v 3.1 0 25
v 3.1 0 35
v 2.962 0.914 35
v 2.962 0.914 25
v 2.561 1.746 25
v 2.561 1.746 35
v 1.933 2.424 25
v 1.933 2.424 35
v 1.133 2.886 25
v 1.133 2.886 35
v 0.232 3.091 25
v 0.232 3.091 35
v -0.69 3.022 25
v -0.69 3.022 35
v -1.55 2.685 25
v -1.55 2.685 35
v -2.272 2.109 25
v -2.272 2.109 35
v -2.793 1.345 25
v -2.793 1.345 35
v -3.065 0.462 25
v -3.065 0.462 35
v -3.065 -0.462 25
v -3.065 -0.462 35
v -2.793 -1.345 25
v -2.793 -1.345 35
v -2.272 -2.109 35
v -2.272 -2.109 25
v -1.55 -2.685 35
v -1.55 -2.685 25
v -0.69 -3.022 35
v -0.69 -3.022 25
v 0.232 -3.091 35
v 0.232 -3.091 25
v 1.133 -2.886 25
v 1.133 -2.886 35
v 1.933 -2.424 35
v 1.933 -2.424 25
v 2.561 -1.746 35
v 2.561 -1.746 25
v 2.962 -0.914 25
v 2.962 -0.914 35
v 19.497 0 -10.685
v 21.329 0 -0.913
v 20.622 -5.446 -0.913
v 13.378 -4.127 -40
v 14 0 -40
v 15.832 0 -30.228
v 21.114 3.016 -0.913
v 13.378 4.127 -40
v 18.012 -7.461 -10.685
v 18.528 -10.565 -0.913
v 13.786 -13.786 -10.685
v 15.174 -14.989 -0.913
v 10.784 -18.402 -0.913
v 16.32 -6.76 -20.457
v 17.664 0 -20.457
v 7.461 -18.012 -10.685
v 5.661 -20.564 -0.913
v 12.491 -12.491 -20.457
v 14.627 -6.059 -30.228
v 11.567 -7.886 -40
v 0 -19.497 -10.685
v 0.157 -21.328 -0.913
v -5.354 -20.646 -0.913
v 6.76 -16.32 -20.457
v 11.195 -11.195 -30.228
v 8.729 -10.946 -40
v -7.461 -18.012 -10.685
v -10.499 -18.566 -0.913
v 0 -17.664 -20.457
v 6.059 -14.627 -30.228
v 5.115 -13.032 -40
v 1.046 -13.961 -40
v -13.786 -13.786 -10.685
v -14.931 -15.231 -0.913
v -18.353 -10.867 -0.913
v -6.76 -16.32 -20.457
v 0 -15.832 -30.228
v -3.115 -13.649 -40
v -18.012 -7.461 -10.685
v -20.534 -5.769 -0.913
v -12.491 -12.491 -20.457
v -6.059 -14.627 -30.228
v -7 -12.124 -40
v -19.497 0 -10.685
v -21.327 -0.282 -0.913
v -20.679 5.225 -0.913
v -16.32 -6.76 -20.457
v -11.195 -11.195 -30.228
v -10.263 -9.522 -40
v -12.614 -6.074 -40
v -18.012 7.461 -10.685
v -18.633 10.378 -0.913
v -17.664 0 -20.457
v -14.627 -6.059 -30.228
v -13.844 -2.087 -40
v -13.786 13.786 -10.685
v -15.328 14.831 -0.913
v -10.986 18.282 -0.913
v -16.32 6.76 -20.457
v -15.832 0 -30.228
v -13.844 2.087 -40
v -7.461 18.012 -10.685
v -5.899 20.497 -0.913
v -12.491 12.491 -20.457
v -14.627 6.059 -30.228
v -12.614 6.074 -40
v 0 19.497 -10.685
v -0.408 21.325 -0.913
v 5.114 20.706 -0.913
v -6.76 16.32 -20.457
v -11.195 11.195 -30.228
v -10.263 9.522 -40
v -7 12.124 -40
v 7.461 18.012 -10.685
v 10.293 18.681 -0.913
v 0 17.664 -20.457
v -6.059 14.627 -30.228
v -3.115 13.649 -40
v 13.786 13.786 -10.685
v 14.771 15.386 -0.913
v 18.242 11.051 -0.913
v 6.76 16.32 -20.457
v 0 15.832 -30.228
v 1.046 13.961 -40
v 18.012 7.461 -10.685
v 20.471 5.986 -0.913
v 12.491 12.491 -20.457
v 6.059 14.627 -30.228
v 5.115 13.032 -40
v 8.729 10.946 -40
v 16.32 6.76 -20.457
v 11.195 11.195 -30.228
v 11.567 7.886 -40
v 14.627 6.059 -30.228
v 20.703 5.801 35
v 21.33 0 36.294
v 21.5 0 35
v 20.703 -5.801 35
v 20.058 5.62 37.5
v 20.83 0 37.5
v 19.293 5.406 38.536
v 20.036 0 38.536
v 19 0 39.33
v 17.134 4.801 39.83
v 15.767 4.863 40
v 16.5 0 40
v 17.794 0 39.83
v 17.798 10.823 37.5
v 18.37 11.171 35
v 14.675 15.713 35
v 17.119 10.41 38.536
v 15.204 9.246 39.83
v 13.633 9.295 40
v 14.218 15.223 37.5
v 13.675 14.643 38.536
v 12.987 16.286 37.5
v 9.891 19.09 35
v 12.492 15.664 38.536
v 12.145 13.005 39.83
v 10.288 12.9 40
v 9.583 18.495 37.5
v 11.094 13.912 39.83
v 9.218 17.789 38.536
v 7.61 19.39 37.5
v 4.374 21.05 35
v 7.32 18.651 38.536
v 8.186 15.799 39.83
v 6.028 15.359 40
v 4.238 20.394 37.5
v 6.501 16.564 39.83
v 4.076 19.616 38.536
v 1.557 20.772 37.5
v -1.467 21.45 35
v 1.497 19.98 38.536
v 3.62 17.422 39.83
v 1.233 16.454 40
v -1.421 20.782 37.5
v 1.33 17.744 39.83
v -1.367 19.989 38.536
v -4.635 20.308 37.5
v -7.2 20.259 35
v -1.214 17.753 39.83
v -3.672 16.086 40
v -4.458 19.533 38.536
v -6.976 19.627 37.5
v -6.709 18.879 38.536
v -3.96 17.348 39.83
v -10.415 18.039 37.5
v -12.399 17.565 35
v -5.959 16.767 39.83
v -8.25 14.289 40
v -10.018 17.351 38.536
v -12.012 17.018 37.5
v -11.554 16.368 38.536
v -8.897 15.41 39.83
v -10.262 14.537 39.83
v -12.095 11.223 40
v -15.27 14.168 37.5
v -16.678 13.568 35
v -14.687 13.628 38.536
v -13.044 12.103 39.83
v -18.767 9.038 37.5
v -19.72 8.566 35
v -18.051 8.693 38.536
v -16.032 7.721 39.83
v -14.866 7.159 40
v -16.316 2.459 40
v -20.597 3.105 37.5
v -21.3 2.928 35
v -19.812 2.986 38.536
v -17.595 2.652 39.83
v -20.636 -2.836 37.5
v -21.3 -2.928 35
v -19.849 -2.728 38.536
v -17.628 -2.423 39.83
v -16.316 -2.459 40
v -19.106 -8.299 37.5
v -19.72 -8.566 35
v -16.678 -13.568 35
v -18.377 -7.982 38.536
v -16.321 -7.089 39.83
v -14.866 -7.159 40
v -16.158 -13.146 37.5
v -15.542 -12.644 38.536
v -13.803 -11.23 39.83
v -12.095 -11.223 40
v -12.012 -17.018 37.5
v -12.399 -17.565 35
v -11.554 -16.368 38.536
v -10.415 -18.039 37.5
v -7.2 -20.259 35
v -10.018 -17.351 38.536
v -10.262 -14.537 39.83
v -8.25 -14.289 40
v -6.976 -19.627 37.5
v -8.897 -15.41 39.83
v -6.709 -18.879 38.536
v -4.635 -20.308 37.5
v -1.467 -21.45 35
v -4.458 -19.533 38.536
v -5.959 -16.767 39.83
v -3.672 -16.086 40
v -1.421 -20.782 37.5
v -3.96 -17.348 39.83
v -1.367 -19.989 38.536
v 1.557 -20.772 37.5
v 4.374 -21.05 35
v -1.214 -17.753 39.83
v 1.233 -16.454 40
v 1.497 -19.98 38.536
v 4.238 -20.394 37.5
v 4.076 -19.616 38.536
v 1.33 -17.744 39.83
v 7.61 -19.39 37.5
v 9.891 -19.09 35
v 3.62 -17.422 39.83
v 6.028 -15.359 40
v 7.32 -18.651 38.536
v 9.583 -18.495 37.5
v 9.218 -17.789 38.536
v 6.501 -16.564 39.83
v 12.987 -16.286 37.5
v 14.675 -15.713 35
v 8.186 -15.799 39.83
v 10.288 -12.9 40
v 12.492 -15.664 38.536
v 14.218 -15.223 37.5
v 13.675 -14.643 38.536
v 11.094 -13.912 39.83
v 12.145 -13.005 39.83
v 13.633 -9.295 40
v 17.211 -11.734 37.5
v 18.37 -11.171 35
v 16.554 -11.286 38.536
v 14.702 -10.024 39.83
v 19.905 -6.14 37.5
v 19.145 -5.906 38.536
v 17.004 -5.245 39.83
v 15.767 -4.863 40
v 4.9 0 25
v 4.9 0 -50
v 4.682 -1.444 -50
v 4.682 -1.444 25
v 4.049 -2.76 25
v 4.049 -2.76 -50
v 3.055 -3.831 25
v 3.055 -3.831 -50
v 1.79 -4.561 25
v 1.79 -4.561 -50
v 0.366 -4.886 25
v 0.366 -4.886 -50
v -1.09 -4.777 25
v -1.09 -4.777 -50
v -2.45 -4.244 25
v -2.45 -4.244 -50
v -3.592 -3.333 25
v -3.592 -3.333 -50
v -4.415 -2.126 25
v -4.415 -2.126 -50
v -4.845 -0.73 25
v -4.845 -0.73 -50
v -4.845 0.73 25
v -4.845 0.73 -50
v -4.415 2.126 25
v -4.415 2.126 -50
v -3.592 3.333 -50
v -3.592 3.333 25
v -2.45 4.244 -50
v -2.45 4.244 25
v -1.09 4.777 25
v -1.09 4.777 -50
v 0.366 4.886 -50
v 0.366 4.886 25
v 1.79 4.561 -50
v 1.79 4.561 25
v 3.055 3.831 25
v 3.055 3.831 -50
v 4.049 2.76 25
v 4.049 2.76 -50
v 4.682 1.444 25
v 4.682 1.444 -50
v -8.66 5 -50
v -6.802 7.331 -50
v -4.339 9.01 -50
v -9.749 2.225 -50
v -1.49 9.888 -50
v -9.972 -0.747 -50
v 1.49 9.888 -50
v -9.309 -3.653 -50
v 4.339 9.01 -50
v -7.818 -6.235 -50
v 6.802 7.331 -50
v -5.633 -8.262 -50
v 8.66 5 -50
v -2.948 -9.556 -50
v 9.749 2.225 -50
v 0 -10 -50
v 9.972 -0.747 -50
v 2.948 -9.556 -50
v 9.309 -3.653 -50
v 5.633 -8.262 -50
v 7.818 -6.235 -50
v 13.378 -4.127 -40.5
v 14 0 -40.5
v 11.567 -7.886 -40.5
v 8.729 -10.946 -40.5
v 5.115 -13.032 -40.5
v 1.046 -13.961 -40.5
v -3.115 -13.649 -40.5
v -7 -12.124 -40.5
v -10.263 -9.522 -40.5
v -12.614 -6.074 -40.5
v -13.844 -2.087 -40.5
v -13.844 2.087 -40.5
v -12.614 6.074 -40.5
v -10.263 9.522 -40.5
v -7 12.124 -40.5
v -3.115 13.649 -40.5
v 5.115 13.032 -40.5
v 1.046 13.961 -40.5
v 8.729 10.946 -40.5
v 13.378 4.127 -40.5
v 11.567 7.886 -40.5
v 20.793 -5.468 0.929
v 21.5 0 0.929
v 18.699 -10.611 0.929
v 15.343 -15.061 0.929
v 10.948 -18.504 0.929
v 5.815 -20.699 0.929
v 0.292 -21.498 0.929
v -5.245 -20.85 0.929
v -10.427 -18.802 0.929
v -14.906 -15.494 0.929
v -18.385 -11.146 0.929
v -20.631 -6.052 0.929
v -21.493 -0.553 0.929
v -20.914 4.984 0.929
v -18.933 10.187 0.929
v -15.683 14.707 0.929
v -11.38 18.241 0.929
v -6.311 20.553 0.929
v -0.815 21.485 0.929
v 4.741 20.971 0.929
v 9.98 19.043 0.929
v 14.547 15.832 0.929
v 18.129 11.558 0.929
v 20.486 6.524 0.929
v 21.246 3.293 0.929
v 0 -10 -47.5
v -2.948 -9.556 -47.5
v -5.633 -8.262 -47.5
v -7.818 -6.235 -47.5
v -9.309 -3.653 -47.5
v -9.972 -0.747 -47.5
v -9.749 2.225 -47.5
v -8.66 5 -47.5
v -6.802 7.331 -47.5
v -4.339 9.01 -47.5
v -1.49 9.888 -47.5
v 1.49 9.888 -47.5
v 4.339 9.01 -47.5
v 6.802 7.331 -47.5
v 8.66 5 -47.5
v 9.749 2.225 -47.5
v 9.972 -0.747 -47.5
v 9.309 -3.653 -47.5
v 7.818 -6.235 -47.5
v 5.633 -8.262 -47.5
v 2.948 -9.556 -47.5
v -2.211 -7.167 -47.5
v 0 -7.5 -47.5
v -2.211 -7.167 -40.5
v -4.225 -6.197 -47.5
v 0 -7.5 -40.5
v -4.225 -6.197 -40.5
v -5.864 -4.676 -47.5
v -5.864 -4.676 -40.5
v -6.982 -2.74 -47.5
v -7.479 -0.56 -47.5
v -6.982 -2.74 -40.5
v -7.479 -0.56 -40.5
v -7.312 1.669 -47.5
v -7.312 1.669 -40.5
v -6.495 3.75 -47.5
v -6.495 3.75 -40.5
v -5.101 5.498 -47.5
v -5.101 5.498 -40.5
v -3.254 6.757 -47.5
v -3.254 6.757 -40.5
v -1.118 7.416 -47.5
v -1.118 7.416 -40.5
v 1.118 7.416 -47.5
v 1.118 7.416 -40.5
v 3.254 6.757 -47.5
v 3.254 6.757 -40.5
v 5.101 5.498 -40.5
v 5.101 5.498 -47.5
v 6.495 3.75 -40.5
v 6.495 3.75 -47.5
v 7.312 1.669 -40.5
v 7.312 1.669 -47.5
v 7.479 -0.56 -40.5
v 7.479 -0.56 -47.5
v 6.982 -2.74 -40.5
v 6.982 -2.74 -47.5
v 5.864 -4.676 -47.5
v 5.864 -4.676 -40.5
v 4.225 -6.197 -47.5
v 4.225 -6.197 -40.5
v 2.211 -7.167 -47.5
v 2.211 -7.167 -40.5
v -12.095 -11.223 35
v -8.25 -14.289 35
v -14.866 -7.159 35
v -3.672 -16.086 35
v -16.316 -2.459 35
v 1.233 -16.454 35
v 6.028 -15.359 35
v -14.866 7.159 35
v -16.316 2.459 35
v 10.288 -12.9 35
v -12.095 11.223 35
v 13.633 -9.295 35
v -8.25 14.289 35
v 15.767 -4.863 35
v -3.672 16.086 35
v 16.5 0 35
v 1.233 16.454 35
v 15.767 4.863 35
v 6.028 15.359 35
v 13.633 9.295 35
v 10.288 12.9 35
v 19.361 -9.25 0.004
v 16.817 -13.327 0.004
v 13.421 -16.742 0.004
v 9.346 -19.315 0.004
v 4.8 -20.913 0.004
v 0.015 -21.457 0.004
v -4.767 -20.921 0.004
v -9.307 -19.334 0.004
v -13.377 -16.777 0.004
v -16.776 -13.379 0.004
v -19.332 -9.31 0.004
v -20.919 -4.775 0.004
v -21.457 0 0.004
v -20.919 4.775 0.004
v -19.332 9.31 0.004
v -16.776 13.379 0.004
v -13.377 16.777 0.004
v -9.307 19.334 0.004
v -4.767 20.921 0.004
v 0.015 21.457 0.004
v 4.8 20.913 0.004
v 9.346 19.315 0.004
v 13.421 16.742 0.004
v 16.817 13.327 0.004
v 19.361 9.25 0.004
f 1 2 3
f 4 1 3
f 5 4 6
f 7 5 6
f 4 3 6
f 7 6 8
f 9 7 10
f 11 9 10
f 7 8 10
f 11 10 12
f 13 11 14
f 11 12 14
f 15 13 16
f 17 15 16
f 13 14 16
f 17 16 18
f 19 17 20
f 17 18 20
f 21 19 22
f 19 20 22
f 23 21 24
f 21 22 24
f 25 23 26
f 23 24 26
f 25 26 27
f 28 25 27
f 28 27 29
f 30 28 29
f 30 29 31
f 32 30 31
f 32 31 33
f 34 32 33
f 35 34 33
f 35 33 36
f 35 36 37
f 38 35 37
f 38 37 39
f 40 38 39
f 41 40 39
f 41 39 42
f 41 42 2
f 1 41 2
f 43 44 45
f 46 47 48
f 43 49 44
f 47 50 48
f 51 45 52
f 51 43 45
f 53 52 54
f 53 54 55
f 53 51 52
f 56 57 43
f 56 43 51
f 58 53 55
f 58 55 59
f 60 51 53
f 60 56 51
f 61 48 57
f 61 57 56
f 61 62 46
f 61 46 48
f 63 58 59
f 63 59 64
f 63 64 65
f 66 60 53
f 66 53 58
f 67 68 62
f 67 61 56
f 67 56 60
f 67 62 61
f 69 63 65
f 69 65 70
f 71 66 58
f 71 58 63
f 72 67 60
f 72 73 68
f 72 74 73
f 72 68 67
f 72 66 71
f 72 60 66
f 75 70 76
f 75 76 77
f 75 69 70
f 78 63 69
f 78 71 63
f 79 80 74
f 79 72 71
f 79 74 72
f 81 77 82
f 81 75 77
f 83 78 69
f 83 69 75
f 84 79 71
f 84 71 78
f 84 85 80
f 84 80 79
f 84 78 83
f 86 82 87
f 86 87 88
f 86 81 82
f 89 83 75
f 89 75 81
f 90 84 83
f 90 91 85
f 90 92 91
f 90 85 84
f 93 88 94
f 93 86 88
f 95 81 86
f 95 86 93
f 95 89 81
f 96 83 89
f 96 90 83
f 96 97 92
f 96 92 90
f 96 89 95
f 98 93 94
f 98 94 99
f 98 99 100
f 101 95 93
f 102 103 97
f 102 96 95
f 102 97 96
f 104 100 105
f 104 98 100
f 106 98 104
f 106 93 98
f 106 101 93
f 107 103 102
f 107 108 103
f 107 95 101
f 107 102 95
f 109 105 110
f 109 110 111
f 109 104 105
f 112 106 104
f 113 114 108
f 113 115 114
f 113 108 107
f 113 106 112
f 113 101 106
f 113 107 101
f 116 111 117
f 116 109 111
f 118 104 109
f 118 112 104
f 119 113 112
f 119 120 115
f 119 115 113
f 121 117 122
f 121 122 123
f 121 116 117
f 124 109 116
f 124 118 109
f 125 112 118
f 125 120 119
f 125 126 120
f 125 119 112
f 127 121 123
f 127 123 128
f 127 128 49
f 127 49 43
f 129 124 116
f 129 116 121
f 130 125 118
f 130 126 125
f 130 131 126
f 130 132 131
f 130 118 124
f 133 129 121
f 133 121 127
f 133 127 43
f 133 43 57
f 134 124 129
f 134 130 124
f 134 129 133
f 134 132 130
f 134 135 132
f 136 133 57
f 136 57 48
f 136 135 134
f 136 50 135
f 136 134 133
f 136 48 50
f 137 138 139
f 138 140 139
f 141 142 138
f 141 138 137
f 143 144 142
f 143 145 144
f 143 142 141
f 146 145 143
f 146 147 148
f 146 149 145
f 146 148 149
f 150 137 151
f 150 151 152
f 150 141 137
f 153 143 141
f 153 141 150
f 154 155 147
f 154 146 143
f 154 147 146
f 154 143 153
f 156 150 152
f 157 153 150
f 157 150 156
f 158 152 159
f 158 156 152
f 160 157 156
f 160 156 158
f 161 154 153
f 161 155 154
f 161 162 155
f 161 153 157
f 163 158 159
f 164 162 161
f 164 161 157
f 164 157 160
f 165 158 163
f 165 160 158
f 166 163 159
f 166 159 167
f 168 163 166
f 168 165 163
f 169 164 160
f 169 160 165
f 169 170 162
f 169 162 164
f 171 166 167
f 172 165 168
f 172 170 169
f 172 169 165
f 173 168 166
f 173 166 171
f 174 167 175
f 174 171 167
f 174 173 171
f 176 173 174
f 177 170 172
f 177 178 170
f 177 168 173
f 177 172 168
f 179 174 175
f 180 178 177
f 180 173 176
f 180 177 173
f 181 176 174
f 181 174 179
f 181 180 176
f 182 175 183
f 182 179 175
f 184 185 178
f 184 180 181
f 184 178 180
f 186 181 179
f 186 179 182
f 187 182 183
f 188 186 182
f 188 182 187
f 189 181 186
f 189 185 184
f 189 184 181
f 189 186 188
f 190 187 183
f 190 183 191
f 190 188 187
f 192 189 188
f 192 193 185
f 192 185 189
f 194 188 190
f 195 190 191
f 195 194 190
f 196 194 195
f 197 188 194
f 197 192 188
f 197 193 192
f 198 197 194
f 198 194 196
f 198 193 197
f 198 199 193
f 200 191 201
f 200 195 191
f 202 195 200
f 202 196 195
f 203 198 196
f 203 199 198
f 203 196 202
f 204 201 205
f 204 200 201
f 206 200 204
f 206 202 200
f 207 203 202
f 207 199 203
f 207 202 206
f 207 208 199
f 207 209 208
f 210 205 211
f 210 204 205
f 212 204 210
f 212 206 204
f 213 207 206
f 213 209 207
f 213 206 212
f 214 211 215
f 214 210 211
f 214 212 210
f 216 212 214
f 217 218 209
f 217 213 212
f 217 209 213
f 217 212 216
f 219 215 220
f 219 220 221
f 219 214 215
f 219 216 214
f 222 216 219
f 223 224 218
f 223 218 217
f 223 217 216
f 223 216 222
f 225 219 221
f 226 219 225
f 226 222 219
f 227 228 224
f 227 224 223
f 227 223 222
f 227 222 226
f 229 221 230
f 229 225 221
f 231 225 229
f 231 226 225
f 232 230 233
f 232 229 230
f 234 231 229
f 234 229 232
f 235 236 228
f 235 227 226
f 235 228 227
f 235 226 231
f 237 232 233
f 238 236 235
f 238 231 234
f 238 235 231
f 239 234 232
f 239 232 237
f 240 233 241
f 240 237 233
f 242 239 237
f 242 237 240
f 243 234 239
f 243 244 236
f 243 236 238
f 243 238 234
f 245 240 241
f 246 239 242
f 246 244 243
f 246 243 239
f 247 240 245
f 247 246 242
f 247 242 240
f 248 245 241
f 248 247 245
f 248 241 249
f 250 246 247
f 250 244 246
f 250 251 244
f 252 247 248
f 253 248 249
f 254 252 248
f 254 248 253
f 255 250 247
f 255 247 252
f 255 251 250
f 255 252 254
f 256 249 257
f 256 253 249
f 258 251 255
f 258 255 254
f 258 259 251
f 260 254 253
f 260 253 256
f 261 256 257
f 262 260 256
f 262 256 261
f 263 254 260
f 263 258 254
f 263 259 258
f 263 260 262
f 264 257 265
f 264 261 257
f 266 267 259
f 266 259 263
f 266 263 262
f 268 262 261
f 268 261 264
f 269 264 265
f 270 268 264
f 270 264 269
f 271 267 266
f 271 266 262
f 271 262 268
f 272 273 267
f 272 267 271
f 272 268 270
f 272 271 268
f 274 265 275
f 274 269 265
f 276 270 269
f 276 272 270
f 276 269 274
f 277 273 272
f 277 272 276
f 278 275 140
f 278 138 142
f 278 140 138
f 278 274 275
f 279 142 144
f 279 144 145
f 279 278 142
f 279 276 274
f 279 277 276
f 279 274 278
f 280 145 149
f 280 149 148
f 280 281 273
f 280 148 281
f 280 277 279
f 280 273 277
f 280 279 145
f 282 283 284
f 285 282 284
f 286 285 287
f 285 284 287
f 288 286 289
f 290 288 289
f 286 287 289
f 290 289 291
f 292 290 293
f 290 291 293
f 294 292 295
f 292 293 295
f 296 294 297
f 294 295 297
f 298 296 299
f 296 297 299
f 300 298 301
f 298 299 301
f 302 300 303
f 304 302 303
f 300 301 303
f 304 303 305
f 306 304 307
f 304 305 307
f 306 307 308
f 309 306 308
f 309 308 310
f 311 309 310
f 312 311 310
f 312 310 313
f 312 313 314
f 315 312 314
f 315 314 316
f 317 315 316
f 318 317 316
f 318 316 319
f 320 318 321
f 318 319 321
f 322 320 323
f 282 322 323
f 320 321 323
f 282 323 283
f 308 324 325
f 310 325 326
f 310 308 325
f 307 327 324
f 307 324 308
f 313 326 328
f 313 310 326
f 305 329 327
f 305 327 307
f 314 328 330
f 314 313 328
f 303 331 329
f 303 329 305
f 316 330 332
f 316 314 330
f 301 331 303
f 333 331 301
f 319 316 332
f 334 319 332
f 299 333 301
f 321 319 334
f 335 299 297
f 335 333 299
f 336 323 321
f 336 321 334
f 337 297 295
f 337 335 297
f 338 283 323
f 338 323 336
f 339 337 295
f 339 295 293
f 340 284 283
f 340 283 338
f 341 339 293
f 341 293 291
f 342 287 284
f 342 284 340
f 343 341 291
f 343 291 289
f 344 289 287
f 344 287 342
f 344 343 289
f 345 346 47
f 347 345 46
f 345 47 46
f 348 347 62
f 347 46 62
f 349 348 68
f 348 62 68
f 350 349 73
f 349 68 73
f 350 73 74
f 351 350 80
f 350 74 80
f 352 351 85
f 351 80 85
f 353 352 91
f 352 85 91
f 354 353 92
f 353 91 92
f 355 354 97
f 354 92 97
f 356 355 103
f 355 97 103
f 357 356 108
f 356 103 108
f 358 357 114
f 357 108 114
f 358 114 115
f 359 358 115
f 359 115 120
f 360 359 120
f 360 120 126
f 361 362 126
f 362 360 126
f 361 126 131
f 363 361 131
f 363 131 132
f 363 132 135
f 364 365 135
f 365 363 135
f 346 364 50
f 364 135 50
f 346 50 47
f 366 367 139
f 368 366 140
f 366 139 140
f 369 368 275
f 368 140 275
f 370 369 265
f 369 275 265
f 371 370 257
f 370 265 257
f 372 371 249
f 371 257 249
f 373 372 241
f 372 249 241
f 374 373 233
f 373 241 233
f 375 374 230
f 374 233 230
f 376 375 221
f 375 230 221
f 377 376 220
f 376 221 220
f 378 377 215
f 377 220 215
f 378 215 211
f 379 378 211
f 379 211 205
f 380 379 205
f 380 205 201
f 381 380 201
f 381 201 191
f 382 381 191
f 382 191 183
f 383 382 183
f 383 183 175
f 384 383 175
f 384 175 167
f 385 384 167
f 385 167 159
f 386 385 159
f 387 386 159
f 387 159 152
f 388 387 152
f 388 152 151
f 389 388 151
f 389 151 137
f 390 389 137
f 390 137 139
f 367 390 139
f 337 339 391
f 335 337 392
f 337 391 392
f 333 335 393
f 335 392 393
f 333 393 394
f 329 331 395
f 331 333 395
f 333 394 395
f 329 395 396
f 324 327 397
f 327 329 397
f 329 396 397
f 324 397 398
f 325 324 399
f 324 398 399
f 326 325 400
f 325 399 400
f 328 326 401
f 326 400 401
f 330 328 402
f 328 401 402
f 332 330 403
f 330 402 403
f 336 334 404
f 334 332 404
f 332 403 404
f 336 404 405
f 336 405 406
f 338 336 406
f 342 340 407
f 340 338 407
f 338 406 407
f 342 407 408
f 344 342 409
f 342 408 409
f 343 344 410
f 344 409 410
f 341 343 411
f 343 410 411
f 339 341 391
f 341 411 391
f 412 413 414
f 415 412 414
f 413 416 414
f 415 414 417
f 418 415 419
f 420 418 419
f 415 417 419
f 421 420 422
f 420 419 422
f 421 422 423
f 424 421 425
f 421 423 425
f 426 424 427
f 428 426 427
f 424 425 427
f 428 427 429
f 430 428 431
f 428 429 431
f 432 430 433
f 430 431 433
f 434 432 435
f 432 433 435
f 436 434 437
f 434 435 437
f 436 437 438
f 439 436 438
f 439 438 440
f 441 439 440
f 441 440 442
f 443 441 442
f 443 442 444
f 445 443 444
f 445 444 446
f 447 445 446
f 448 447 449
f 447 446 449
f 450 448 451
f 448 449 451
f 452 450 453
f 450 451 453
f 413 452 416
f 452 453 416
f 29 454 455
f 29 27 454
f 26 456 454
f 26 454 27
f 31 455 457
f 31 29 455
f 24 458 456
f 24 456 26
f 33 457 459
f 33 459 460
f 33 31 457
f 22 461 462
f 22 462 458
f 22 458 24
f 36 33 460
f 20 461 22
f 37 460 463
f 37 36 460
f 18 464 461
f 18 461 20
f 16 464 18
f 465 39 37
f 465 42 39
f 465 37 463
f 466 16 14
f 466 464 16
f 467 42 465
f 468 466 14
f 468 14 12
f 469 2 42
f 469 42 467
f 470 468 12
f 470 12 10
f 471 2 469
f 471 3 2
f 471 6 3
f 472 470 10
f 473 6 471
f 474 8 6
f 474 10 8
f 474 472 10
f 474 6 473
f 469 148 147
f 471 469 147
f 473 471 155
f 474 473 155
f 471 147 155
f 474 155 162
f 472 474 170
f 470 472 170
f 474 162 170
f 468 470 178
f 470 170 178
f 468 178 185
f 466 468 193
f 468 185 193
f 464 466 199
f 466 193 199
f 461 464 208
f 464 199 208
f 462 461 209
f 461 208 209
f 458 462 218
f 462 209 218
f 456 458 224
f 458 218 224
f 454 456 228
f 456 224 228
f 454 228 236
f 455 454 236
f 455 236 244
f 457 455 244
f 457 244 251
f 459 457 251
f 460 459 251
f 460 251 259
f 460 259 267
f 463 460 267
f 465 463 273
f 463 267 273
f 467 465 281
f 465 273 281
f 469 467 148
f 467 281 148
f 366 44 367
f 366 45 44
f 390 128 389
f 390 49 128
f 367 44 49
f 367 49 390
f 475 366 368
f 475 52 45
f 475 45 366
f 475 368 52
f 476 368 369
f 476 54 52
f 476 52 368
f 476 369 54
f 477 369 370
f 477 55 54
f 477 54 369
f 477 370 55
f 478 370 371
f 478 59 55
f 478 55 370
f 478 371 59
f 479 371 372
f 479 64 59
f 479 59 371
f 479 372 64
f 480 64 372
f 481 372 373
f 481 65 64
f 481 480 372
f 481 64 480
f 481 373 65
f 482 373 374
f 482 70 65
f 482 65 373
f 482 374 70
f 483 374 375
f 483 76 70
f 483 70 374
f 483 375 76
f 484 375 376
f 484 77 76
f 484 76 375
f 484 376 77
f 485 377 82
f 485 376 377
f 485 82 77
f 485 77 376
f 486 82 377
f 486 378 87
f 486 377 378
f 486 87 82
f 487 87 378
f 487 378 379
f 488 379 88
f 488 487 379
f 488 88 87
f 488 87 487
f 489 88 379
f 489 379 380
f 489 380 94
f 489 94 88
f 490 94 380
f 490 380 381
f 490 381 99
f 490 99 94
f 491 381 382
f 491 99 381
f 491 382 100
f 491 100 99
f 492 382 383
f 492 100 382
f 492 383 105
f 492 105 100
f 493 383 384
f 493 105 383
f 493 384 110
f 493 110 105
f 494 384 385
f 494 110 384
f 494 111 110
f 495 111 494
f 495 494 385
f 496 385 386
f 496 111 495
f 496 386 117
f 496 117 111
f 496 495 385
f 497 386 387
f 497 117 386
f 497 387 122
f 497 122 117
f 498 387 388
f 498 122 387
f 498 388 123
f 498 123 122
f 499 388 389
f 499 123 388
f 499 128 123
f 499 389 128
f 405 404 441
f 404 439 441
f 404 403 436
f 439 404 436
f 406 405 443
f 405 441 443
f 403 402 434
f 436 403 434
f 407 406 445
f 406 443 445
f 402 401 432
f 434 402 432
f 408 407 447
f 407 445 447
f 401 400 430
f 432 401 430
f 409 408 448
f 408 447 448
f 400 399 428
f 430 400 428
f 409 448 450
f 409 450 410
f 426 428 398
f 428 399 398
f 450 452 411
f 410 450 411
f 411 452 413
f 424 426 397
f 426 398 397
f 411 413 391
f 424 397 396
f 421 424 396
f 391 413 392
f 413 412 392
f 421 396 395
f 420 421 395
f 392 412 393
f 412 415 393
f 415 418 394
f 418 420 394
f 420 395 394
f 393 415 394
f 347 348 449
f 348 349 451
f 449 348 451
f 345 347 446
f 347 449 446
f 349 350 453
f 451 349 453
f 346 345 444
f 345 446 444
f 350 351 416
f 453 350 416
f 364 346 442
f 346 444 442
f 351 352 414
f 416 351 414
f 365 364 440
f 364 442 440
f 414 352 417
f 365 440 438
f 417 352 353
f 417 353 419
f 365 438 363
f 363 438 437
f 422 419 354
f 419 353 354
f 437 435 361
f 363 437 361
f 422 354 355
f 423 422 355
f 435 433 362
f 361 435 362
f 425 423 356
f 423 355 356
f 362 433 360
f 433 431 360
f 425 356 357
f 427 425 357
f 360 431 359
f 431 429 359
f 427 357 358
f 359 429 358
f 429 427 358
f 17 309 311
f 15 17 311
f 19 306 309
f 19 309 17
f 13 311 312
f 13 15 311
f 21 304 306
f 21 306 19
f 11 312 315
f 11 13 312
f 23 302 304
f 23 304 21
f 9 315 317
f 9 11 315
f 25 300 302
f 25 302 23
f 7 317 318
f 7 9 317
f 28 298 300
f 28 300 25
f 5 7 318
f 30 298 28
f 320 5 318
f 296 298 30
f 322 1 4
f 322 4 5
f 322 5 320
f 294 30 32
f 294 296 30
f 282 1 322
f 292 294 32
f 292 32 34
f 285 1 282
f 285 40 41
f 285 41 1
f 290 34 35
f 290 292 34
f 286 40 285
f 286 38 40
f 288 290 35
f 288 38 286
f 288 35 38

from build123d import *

# Parameters (mm, degrees)
F0_R      = 21.5
F1_DEPTH  = 40
F2_R      = 5
F3_R      = 21.5
F4_DEPTH  = 40
F5_SIZE2  = 7.5
F5_SIZE   = 40
F6_DEPTH  = 10
F7_R      = 10
F10_R     = 4.9
F11_DEPTH = 75
F12_R     = 16.5
F13_DEPTH = 5
F14_R     = 3.1
F15_DEPTH = 85.001


with BuildPart() as f1:
    # F0 (on Top) → F1 (new body)
    with BuildSketch(Plane.XY):
        Circle(F0_R)
    extrude(amount=F1_DEPTH)

    # F2
    f2_edges = [f1.edges().sort_by_distance(p)[0] for p in [
        (-21.5, 0, 40),
    ]]
    fillet(f2_edges, radius=F2_R)

    # F3 (on face) → F4 (join)
    with BuildSketch(Plane(origin=(0, 0, 0), x_dir=(1, 0, 0), z_dir=(0, 0, -1))):
        Circle(F3_R)
    extrude(amount=F4_DEPTH)

    # F5
    f5_edges = [f1.edges().sort_by_distance(p)[0] for p in [
        (-21.5, 0, -40),
    ]]
    chamfer(f5_edges, length=F5_SIZE, length2=F5_SIZE2)

    # F6 (add): a face of the model
    f6_faces = [f1.faces().sort_by_distance(p)[0] for p in [
        (0, 0, -40),
    ]]
    extrude(f6_faces, amount=F6_DEPTH)

    # F7
    f7_edges = [f1.edges().sort_by_distance(p)[0] for p in [
        (-21.5, 0, 0),
    ]]
    fillet(f7_edges, radius=F7_R)

    # F8 (on Right) → F9 (revolve, cut)
    with BuildSketch(Plane.YZ):
        Polygon((-7.5, -40.5), (-17.4298945979, -40.5), (-17.4298945979, -47.5), (-17.4298945979, -53.659953177), (-10, -53.659953177), (-10, -47.5), (-7.5, -47.5), align=None)
    revolve(axis=Axis((0, 0, -53.4000843763), (0, 0, -1)), mode=Mode.SUBTRACT)

    # F10 (on face) → F11 (cut)
    with BuildSketch(Plane(origin=(0, 0, -50), x_dir=(1, 0, 0), z_dir=(0, 0, -1))):
        Circle(F10_R)
    extrude(amount=-F11_DEPTH, mode=Mode.SUBTRACT)

    # F12 (on face) → F13 (cut)
    with BuildSketch(Plane.XY.offset(40)):
        Circle(F12_R)
    extrude(amount=-F13_DEPTH, mode=Mode.SUBTRACT)

    # F14 (on face) → F15 (cut, through all)
    with BuildSketch(Plane.XY.offset(35)):
        Circle(F14_R)
    extrude(amount=-F15_DEPTH, mode=Mode.SUBTRACT)


solid = f1.part
